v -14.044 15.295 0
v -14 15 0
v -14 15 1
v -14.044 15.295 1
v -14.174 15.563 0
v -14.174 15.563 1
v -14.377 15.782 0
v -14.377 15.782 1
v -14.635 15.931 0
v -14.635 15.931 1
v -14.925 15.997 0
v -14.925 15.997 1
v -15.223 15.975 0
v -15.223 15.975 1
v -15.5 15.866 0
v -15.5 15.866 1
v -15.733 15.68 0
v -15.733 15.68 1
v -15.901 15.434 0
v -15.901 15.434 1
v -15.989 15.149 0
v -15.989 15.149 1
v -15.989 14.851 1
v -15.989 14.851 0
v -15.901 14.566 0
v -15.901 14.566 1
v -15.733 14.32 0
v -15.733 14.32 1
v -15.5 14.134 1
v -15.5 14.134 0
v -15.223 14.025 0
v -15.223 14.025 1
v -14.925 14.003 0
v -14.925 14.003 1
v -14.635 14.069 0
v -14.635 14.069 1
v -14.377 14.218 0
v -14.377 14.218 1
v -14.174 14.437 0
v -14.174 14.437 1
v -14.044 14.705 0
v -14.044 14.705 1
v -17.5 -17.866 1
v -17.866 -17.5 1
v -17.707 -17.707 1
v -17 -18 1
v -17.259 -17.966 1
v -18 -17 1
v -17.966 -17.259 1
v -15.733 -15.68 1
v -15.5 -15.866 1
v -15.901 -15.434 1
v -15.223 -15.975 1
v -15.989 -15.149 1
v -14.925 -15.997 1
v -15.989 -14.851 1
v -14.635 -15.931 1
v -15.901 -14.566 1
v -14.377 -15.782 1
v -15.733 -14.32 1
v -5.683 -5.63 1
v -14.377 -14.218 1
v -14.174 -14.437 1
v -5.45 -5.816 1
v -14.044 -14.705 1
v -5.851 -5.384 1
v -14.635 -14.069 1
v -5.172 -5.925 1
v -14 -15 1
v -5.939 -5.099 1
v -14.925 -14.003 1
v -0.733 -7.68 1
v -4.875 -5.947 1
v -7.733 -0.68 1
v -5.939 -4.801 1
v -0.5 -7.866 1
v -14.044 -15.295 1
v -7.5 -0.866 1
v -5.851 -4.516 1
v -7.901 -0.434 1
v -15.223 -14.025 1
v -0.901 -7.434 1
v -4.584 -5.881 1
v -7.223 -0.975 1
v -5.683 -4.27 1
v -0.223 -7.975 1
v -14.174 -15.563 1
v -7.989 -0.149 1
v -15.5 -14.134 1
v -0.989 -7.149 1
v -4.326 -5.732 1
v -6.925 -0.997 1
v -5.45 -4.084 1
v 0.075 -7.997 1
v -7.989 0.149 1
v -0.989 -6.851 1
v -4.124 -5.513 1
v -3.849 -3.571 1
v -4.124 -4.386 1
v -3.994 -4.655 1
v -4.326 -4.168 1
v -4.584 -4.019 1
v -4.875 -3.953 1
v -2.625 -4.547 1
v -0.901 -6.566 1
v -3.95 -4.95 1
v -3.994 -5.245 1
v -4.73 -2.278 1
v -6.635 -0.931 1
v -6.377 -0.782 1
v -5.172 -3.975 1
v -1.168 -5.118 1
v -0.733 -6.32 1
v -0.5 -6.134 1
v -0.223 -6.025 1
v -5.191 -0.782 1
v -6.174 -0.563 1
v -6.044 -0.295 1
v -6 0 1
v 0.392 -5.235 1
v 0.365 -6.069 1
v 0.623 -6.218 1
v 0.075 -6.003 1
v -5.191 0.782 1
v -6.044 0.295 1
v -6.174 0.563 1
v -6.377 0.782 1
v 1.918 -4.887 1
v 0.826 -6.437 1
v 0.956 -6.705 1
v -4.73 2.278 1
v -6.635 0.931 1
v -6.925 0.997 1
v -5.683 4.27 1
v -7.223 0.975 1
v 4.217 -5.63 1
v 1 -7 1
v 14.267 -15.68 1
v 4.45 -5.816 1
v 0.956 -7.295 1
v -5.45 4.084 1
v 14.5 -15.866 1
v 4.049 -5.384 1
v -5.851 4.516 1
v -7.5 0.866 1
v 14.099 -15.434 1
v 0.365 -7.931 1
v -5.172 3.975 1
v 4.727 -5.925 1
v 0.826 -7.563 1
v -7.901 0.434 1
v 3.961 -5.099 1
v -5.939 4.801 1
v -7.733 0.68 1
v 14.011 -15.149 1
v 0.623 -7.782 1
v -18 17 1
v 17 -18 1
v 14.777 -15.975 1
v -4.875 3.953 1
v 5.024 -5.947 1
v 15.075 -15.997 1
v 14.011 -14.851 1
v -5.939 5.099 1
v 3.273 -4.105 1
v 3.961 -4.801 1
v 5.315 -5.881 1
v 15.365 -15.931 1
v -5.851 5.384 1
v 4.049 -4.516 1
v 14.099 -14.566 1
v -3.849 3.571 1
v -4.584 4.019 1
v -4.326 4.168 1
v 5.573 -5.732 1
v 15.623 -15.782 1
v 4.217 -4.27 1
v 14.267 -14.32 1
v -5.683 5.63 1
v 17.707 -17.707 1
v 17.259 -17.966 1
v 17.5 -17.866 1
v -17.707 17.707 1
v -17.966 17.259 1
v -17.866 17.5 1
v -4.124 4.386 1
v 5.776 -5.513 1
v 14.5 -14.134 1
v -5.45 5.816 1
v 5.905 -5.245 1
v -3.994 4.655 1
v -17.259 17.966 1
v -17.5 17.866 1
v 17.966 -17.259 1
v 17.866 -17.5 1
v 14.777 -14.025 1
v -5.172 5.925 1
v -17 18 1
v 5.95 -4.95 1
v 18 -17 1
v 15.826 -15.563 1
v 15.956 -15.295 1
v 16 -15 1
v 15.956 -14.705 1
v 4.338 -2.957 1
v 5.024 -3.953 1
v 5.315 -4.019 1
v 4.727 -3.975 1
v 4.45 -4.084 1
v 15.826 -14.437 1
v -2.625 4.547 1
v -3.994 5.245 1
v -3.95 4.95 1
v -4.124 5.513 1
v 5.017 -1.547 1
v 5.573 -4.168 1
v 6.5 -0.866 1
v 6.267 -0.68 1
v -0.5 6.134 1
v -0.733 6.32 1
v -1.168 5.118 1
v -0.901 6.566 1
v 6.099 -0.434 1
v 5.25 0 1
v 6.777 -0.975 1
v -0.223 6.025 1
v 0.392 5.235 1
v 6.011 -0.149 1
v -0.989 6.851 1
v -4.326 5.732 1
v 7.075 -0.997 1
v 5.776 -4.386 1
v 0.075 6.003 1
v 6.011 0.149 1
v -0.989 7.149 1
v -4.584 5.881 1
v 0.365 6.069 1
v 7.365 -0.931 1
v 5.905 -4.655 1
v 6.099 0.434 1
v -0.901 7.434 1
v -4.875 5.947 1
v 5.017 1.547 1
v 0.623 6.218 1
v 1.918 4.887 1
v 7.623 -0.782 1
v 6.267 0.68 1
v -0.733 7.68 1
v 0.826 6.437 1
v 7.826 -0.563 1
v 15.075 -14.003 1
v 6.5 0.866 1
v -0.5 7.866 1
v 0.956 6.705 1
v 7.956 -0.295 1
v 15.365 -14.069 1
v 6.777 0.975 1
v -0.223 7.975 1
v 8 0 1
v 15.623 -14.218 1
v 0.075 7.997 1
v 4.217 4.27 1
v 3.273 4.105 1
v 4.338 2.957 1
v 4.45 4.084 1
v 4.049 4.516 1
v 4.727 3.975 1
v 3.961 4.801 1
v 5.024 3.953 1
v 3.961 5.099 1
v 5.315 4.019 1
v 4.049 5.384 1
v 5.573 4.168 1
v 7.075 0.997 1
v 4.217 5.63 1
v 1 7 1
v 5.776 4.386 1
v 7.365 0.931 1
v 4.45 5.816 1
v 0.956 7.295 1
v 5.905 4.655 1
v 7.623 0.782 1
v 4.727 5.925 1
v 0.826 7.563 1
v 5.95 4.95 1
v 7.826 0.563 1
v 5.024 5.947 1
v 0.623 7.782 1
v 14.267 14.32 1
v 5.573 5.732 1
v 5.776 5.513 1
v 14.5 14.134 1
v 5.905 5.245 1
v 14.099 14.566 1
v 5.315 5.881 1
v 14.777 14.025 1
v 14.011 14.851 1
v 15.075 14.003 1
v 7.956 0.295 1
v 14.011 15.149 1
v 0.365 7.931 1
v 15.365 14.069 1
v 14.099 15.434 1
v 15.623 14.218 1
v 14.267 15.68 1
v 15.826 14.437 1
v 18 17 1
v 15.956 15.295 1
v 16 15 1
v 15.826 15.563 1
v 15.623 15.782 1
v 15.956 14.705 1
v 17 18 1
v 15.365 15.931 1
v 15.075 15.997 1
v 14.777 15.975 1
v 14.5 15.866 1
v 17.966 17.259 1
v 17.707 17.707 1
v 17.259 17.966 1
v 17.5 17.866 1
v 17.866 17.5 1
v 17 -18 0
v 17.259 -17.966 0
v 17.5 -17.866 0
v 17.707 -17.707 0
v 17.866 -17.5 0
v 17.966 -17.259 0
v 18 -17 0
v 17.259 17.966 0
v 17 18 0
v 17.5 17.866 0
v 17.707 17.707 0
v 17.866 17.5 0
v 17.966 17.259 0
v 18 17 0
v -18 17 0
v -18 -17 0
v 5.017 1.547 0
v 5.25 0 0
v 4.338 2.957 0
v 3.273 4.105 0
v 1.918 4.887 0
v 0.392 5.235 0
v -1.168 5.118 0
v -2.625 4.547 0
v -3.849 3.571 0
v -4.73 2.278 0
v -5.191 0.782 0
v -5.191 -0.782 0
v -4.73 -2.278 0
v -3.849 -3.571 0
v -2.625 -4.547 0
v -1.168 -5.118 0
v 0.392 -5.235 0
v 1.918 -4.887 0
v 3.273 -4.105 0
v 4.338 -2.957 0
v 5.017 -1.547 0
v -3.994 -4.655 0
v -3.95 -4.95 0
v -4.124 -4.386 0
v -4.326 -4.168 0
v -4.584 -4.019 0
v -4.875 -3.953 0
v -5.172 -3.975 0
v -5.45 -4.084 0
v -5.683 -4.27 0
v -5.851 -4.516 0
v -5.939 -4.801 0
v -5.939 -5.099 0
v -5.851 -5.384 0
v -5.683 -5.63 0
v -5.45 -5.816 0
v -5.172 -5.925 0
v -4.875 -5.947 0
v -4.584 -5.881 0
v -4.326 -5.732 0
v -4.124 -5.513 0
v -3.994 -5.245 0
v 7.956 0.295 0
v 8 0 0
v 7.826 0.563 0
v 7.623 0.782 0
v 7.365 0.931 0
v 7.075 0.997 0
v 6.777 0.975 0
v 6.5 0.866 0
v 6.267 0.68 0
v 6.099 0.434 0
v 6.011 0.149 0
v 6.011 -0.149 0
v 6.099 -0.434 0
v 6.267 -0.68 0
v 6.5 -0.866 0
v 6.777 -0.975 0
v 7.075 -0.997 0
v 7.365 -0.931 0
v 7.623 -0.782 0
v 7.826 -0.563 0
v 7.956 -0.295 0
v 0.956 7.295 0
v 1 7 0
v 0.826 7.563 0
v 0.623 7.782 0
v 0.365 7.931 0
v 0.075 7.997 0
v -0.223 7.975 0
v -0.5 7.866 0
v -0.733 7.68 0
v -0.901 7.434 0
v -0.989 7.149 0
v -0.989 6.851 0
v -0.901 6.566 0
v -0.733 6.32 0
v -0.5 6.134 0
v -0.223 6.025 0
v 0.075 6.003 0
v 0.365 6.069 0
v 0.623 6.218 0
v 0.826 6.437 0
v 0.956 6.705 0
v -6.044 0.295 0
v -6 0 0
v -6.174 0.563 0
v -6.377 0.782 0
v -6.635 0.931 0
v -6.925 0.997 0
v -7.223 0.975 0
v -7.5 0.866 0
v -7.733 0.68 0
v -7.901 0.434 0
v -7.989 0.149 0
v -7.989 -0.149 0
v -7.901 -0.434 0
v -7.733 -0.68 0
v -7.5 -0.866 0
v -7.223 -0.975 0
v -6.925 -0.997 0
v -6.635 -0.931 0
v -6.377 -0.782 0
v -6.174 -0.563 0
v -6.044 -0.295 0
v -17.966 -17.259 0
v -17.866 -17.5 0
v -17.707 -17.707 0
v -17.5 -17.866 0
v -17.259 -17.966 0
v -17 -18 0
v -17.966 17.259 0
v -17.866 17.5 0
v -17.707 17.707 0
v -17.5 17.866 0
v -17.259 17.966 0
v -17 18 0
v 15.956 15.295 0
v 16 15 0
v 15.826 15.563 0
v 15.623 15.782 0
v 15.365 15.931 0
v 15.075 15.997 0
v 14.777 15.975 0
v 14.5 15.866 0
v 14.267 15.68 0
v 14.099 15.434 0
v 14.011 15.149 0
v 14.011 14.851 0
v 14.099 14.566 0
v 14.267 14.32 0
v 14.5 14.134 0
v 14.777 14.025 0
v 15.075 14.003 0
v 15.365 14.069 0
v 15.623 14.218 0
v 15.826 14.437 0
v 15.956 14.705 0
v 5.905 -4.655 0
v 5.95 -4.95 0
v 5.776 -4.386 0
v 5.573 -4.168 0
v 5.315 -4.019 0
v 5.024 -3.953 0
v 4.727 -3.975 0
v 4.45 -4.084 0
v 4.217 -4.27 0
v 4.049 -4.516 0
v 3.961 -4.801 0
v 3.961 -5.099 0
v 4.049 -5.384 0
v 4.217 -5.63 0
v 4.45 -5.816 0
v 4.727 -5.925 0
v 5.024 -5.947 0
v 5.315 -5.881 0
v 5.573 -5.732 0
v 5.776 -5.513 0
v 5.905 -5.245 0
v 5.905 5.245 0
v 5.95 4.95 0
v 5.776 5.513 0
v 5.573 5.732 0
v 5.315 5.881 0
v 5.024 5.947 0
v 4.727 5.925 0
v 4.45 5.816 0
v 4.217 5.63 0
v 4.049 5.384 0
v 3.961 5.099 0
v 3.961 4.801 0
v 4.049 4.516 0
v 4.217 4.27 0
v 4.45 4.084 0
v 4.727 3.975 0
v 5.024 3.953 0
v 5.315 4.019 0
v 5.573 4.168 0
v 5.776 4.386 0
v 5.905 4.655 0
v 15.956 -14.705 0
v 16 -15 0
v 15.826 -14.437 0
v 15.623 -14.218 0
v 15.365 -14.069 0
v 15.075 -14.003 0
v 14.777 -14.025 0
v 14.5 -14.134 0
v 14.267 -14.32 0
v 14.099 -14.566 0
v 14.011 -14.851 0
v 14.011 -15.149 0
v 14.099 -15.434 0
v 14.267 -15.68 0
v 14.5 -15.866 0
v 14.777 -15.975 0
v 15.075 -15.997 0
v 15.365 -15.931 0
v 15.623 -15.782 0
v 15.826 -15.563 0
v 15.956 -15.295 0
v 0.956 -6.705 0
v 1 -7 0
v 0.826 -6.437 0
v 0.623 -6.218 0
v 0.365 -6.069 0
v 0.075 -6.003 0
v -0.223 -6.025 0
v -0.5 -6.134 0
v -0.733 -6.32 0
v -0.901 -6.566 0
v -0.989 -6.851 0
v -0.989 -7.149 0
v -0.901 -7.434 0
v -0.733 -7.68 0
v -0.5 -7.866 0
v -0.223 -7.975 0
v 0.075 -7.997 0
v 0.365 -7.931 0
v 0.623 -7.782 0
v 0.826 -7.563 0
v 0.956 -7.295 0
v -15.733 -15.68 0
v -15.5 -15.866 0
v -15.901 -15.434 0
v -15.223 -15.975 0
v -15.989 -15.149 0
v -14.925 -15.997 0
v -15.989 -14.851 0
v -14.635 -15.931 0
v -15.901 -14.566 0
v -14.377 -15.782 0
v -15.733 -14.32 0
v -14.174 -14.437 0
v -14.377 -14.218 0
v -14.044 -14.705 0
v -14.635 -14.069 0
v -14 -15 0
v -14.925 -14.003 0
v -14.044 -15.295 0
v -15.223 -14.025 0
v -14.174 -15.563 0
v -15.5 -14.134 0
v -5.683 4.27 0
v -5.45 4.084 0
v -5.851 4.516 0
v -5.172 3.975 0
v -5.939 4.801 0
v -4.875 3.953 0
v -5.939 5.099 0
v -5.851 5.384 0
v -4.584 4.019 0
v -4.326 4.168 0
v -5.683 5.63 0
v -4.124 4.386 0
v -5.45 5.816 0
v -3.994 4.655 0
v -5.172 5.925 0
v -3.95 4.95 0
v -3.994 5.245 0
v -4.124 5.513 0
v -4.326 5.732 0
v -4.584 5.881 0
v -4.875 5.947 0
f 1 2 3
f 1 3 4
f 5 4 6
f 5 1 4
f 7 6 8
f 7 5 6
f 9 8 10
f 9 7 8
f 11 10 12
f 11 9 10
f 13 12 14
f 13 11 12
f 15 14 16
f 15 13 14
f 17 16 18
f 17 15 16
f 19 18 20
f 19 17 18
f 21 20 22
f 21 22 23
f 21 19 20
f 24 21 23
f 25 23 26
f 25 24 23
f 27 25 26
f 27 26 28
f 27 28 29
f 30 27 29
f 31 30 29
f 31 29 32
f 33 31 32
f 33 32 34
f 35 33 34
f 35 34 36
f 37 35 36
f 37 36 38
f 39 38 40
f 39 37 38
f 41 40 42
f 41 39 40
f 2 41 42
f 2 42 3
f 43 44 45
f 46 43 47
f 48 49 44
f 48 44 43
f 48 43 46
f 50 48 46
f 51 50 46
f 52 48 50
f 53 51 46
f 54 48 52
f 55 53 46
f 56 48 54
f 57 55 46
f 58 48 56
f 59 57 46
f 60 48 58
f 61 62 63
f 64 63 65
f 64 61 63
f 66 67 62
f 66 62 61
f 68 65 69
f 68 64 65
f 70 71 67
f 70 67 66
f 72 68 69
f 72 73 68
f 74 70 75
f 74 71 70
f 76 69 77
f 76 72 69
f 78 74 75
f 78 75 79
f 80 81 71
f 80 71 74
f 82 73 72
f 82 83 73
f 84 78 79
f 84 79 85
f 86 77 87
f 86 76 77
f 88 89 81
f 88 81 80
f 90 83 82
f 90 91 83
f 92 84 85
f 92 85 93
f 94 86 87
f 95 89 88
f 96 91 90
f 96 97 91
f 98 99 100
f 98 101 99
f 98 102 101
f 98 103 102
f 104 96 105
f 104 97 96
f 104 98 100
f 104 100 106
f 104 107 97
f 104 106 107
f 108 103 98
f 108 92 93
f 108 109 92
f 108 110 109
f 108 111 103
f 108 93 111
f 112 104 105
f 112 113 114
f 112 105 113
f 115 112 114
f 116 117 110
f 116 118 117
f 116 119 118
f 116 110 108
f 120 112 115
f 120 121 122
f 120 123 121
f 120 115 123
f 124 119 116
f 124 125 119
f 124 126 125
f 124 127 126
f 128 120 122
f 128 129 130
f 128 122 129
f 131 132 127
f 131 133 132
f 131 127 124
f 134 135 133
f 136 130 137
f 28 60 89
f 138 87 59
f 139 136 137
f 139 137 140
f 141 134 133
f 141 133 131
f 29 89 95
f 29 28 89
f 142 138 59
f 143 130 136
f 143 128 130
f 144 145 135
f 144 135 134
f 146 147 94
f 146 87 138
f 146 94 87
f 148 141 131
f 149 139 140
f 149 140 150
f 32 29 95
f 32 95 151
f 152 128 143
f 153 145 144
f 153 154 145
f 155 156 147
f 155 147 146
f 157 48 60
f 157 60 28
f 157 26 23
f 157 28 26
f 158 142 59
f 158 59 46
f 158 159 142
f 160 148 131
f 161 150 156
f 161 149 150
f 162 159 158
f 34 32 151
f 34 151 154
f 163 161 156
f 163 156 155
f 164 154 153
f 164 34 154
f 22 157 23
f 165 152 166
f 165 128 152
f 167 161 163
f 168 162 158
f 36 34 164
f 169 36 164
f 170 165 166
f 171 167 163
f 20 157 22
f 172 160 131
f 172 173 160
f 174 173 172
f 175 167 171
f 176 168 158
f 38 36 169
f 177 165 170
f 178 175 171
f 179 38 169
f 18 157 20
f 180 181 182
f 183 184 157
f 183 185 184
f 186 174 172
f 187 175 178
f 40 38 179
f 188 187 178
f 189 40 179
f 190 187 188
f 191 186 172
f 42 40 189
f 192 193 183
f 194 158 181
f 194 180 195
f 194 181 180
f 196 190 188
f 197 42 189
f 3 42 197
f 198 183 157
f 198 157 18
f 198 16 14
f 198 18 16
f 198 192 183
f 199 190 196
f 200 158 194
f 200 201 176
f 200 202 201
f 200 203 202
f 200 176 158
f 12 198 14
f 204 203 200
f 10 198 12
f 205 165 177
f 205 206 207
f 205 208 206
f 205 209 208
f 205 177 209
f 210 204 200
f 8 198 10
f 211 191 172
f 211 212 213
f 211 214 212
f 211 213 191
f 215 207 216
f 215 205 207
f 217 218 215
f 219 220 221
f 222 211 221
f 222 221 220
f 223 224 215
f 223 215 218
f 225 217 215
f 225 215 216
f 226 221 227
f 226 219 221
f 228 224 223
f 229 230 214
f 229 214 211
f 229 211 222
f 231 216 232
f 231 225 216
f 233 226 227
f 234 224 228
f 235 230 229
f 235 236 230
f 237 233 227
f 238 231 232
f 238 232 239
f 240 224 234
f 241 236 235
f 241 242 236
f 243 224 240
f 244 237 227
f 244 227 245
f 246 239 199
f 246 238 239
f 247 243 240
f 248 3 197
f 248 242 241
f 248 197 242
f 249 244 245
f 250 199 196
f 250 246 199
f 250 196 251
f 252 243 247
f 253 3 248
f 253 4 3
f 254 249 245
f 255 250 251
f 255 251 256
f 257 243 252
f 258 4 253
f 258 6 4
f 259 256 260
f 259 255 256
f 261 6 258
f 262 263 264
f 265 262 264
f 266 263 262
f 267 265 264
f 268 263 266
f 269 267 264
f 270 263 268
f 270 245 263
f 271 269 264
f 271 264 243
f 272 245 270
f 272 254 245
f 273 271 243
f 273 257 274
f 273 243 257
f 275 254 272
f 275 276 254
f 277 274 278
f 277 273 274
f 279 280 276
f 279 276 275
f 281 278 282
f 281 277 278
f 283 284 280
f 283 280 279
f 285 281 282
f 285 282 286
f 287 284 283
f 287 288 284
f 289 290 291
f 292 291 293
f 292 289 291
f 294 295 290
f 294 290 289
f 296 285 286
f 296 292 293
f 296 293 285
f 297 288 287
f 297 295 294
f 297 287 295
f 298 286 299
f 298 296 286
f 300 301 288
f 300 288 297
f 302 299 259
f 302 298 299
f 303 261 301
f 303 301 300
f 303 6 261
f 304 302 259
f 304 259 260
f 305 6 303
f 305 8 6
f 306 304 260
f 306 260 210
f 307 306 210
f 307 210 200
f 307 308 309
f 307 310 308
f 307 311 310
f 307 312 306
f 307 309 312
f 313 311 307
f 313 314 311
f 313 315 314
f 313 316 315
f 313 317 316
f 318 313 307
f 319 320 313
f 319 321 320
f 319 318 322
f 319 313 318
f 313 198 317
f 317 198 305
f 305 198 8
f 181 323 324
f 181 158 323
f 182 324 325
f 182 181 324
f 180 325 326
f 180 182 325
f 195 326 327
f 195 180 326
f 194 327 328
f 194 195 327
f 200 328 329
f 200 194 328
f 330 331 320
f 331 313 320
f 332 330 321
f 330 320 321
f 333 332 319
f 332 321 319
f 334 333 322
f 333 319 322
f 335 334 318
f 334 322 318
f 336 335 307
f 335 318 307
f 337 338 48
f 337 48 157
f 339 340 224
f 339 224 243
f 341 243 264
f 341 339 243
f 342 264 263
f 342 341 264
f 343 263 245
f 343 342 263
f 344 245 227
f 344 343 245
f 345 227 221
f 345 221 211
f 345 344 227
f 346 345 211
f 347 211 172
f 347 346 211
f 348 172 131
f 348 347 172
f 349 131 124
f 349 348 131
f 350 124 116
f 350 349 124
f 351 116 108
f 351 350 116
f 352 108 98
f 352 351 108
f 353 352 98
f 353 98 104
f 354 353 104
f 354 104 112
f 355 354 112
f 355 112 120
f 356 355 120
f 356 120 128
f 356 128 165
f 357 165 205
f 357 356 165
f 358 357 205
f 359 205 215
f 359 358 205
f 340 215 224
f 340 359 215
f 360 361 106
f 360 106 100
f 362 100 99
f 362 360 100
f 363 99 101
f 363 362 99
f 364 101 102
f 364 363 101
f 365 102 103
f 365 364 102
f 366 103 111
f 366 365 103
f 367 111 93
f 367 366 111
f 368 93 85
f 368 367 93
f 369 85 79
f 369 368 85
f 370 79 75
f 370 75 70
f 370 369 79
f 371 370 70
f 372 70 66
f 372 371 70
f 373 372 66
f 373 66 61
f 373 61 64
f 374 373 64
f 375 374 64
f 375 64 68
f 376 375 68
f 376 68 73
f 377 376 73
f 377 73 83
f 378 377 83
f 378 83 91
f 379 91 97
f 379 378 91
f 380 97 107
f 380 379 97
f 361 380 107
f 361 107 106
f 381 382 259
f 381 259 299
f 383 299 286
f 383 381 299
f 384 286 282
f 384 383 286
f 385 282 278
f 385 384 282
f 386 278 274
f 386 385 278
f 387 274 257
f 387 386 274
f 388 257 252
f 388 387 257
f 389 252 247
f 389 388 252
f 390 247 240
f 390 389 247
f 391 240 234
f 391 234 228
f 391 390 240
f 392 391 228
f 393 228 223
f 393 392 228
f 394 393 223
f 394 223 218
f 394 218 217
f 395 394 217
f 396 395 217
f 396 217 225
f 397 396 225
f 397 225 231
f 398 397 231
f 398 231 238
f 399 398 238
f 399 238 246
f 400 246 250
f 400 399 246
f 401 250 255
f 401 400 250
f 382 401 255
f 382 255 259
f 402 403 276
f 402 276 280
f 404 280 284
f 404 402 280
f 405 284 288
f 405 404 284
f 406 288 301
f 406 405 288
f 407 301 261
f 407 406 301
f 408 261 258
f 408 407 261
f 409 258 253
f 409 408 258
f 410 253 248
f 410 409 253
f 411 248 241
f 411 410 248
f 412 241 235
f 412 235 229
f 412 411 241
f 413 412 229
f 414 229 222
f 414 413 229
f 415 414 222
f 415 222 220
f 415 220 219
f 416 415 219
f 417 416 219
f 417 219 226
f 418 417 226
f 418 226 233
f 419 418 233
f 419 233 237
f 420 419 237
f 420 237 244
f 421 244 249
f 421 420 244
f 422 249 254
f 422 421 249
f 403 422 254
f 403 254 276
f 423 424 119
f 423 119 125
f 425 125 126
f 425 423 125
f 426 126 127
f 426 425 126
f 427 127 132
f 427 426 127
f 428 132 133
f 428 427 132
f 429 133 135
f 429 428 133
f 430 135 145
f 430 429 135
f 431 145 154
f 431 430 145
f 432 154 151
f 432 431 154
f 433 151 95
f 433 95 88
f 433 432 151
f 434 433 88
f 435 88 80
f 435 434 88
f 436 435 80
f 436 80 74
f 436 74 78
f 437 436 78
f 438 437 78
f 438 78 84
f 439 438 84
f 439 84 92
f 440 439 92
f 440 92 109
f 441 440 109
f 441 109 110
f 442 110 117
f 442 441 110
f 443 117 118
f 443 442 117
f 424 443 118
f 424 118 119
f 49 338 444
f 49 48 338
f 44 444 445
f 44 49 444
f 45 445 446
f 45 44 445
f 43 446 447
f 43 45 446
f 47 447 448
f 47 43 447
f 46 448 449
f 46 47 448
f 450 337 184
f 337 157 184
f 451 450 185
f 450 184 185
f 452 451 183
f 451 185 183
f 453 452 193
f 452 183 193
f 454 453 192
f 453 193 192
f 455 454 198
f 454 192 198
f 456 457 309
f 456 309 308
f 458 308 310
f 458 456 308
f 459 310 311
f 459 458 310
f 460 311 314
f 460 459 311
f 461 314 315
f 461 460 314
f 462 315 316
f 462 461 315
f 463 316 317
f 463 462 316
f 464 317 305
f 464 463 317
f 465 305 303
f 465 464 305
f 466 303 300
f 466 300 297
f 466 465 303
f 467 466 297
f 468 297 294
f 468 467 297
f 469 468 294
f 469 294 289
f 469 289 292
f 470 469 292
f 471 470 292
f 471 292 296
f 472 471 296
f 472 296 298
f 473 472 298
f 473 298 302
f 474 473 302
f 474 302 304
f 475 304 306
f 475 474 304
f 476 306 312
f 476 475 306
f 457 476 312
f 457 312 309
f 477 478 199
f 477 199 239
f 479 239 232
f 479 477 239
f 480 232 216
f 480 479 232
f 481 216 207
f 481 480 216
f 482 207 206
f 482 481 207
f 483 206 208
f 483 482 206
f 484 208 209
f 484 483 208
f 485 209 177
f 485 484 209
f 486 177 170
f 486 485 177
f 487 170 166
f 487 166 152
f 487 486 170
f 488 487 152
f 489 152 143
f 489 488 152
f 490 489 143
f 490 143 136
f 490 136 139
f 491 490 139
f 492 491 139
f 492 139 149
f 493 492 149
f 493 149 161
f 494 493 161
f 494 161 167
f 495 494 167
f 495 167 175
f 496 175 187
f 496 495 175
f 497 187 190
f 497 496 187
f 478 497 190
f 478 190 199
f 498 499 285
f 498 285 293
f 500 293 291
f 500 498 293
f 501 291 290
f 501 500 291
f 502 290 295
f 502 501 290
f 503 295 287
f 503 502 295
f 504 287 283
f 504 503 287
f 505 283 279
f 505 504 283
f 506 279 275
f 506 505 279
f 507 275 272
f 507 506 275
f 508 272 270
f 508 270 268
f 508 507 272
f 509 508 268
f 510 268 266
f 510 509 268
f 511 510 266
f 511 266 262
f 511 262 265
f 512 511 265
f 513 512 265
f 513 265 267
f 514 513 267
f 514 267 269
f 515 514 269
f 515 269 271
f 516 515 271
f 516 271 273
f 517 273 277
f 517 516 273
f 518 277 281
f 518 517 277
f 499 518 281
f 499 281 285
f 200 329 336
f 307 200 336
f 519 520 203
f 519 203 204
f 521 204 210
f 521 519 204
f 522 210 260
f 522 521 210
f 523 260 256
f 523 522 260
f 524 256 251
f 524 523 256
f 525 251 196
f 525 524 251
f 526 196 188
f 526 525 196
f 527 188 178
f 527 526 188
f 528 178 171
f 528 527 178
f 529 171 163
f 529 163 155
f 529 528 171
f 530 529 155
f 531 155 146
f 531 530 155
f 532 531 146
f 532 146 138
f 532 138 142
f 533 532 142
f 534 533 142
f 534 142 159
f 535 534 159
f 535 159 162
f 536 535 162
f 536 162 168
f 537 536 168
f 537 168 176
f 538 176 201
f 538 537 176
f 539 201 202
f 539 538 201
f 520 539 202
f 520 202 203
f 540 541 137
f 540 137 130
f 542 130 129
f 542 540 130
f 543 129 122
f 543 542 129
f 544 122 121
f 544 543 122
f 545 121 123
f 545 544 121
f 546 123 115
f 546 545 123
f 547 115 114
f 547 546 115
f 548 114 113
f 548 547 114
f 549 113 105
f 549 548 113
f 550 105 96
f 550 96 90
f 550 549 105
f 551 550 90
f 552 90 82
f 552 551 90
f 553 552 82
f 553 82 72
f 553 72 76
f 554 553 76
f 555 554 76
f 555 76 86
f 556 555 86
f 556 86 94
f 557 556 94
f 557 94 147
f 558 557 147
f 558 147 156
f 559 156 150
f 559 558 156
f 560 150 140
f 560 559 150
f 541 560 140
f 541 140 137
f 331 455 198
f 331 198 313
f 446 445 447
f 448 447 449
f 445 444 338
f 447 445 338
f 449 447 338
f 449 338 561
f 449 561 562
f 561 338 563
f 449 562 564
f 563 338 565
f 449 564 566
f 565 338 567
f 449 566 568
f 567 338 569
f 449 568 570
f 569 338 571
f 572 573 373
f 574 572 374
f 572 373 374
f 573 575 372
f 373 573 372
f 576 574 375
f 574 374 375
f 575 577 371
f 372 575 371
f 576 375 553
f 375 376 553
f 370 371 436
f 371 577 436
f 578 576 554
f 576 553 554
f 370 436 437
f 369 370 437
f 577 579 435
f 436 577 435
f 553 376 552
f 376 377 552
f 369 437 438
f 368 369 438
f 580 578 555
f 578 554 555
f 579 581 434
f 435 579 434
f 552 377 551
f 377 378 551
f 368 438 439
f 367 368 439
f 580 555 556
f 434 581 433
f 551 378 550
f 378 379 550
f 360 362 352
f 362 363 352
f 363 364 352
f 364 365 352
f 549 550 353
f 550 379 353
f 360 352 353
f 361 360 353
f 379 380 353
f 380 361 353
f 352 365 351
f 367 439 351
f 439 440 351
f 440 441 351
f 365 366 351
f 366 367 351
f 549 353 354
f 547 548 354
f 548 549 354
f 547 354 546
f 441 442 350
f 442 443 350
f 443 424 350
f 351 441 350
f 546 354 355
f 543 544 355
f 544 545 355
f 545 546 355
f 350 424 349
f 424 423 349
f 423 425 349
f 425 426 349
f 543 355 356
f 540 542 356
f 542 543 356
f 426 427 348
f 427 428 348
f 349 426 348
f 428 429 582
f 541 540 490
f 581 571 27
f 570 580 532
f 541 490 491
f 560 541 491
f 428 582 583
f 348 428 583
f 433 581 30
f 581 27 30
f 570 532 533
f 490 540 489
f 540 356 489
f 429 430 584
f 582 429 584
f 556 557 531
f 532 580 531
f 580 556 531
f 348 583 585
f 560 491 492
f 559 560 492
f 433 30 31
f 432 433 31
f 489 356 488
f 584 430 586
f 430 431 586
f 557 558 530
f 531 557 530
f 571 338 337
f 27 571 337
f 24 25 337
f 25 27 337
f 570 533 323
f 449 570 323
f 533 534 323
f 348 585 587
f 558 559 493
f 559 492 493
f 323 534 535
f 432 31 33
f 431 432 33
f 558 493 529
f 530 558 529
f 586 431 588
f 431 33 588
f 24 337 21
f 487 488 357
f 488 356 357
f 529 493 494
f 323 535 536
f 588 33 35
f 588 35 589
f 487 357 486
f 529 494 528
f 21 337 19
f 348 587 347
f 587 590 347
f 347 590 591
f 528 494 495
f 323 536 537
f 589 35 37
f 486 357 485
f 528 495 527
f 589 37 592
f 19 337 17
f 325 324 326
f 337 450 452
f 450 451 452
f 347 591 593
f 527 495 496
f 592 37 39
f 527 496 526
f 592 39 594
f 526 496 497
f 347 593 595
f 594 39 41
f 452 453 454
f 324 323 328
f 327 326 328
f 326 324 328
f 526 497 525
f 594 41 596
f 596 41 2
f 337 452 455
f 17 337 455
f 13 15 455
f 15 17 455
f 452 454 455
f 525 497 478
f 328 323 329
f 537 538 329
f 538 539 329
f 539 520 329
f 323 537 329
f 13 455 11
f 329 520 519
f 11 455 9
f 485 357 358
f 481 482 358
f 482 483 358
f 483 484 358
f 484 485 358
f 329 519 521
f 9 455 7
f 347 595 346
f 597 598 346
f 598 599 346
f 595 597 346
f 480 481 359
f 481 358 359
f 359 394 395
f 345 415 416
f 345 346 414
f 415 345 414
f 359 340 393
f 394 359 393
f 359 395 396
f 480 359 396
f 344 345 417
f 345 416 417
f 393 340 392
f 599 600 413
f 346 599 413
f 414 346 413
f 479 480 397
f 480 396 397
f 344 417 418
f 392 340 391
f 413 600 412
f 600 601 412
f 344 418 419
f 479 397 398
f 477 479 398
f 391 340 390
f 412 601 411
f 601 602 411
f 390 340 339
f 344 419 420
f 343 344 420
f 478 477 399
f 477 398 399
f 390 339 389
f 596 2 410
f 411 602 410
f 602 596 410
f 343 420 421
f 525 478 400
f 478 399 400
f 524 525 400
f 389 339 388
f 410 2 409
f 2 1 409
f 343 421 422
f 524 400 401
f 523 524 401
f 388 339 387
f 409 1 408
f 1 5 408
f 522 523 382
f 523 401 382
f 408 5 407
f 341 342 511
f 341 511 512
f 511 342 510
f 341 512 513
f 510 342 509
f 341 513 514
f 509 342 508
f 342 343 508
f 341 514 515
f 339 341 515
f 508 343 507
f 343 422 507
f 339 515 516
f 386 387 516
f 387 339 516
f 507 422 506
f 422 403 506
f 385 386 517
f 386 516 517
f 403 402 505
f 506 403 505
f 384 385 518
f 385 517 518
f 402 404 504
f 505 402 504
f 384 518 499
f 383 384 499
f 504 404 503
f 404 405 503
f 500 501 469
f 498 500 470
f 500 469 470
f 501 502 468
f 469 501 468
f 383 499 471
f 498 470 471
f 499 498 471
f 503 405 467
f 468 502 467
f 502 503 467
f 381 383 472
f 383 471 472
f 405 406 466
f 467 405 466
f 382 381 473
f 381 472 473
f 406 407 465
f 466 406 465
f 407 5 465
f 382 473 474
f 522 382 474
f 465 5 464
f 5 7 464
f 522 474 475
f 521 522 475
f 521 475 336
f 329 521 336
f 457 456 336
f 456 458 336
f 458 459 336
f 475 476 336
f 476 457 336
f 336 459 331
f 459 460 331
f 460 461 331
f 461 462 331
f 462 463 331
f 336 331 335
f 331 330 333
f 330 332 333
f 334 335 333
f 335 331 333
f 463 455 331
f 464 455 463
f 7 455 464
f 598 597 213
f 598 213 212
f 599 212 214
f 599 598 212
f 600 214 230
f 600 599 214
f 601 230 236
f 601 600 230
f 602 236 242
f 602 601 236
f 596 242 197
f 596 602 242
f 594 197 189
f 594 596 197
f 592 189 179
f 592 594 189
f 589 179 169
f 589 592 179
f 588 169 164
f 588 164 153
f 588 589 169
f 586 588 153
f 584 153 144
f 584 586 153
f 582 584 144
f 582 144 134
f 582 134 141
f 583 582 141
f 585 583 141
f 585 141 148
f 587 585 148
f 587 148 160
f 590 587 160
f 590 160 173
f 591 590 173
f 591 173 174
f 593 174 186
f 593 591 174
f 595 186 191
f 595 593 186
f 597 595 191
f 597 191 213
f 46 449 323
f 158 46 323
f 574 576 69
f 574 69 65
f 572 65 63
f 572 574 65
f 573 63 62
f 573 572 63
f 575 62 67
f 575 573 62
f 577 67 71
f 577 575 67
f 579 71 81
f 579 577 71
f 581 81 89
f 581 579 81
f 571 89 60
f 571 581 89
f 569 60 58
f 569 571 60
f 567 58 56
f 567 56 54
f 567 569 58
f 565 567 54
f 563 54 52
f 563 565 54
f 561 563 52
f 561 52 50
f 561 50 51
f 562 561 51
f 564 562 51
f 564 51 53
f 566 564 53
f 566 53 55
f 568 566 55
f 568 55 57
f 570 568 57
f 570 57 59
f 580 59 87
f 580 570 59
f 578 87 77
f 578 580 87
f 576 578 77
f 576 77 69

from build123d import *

# Parameters (mm, degrees)
F0_W     = 36
F0_H     = 36
F0_R     = 1
F0_R_2   = 5.25
F1_DEPTH = 1
F2_R     = 1


with BuildPart() as f1:
    # F0 (on Top) → F1 (new body)
    with BuildSketch(Plane.XY):
        Rectangle(F0_W, F0_H)
        with Locations((-15, -15)):
            Circle(F0_R, mode=Mode.SUBTRACT)
        with Locations((-4.949747, -4.949747)):
            Circle(F0_R, mode=Mode.SUBTRACT)
        with Locations((15, -15)):
            Circle(F0_R, mode=Mode.SUBTRACT)
        with Locations((0, -7)):
            Circle(F0_R, mode=Mode.SUBTRACT)
        with Locations((4.949747, -4.949747)):
            Circle(F0_R, mode=Mode.SUBTRACT)
        with Locations((-7, 0)):
            Circle(F0_R, mode=Mode.SUBTRACT)
        with Locations((-4.949747, 4.949747)):
            Circle(F0_R, mode=Mode.SUBTRACT)
        with Locations((-15, 15)):
            Circle(F0_R, mode=Mode.SUBTRACT)
        Circle(F0_R_2, mode=Mode.SUBTRACT)
        with Locations((7, 0)):
            Circle(F0_R, mode=Mode.SUBTRACT)
        with Locations((0, 7)):
            Circle(F0_R, mode=Mode.SUBTRACT)
        with Locations((4.949747, 4.949747)):
            Circle(F0_R, mode=Mode.SUBTRACT)
        with Locations((15, 15)):
            Circle(F0_R, mode=Mode.SUBTRACT)
    extrude(amount=F1_DEPTH)

    # F2
    f2_edges = [f1.edges().sort_by_distance(p)[0] for p in [
        (-18, 18, 0.5),
        (18, 18, 0.5),
        (-18, -18, 0.5),
        (18, -18, 0.5),
    ]]
    fillet(f2_edges, radius=F2_R)


solid = f1.part
